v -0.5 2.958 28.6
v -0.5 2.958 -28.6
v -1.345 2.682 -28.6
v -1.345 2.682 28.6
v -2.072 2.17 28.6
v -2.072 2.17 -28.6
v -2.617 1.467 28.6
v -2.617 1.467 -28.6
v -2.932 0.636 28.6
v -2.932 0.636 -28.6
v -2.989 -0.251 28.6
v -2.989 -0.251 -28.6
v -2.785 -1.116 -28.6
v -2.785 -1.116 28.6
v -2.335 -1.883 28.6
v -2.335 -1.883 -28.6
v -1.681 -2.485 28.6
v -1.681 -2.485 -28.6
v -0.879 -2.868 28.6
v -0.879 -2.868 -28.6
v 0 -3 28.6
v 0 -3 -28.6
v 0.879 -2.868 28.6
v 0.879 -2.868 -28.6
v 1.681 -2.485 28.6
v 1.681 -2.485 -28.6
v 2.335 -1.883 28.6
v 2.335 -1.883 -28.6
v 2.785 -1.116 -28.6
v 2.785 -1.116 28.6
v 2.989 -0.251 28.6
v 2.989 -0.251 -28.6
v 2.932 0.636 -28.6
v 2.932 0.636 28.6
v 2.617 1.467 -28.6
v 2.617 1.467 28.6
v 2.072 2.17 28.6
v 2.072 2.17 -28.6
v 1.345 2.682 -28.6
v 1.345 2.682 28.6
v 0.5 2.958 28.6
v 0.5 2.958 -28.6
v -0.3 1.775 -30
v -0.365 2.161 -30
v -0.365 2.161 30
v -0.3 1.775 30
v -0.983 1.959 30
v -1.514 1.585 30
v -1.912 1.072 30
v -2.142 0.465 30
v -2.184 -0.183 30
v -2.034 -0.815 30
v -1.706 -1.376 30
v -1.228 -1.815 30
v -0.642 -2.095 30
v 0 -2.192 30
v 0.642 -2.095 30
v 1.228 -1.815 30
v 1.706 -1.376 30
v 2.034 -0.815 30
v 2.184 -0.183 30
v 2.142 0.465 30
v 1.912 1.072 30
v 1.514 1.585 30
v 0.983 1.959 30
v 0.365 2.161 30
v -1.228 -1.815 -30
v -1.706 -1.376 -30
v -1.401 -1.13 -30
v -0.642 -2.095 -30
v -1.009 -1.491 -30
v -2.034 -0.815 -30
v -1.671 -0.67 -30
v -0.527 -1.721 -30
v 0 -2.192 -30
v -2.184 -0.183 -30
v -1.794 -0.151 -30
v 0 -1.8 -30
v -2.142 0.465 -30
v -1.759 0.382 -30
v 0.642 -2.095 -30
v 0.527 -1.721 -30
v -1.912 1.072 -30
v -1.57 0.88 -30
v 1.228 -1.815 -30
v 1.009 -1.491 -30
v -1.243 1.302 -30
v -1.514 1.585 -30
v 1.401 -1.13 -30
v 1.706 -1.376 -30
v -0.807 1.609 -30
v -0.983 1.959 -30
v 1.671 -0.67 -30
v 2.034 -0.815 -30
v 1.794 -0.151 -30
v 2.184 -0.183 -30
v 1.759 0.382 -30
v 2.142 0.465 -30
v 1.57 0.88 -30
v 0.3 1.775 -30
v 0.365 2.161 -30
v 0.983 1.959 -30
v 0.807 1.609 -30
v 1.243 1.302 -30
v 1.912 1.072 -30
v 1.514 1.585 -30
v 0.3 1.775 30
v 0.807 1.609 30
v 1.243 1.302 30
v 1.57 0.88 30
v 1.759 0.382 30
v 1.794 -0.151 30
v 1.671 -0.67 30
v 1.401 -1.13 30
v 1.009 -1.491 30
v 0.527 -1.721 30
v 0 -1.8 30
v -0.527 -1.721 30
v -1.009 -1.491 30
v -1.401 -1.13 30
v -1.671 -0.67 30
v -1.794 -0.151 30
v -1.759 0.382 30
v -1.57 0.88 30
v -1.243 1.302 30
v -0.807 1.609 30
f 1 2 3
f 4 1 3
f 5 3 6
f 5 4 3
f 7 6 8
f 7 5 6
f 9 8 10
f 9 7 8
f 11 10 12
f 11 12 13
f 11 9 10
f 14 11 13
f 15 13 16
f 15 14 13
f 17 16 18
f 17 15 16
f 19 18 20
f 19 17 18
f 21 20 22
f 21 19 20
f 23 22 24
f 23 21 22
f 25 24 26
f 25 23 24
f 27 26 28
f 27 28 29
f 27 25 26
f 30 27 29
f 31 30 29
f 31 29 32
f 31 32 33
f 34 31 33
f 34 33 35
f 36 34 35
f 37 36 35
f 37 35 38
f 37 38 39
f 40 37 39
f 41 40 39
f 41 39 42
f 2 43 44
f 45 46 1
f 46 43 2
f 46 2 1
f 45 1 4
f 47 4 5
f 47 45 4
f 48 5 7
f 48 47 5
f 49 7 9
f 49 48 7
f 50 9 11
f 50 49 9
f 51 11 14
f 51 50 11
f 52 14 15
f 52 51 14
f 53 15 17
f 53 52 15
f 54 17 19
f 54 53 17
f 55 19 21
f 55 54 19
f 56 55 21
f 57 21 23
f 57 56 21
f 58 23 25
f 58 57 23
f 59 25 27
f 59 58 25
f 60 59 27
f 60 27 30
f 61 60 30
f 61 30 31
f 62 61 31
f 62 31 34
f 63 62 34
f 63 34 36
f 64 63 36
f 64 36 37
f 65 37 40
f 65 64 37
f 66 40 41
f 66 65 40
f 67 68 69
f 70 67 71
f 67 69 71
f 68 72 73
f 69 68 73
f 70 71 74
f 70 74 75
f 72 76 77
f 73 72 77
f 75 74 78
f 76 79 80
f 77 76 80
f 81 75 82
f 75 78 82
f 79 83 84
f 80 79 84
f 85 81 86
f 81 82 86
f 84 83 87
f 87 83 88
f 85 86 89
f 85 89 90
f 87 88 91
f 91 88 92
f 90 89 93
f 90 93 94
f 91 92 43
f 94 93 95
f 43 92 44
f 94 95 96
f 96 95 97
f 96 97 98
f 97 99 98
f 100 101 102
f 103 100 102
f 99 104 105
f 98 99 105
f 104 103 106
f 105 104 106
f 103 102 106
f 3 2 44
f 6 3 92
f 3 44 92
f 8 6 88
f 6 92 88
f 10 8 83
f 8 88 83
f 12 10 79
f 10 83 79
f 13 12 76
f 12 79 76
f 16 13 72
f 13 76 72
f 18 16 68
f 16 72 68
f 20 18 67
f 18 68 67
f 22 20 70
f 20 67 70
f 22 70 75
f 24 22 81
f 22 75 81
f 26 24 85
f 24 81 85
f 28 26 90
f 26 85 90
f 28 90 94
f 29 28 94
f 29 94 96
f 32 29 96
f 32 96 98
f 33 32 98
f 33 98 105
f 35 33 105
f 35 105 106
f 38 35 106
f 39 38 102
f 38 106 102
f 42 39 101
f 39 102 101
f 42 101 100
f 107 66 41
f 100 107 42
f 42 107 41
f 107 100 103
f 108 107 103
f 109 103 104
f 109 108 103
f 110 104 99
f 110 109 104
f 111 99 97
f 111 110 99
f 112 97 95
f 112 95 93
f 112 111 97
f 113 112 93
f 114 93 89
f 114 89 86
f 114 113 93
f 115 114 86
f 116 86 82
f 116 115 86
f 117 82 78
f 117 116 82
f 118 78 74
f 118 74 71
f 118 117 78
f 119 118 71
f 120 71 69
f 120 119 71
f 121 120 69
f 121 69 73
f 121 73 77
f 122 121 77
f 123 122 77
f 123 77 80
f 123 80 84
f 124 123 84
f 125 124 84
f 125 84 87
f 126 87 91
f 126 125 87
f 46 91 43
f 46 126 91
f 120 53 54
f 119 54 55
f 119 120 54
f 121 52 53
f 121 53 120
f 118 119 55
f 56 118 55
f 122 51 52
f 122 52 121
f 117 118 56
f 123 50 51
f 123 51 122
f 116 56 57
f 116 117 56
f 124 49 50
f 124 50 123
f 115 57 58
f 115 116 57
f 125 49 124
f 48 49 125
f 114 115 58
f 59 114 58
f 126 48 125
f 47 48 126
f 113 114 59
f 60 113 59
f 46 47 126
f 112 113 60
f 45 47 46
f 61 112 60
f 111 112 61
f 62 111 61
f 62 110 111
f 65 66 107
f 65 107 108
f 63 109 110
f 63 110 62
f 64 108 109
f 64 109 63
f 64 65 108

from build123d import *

# Parameters (mm, degrees)
BASE_EXTRUDE_THIN_DEPTH = 30
CHAMFER1_SIZE           = 1.4
CHAMFER1_SIZE2          = 0.808290377


with BuildPart() as part:
    # Sketch1 → Base-Extrude-Thin (new, symmetric)
    with BuildSketch(Plane.XY):
        with BuildLine():
            ThreePointArc((-0.5, 2.958039892), (0, -3), (0.5, 2.958039892))
            Line((0.5, 2.958039892), (0.3, 1.774823935))
            ThreePointArc((0.3, 1.774823935), (0, -1.8), (-0.3, 1.774823935))
            Line((-0.3, 1.774823935), (-0.5, 2.958039892))
        make_face()
    extrude(amount=BASE_EXTRUDE_THIN_DEPTH, both=True)

    # Chamfer1
    chamfer1_edges = [part.edges().sort_by_distance(p)[0] for p in [
        (0, -3, 30),
        (0, -3, -30),
    ]]
    chamfer1_side = [part.faces().sort_by_distance(p)[0] for p in [
        (0, -3, 0),
    ]]
    chamfer(chamfer1_edges, length=CHAMFER1_SIZE, length2=CHAMFER1_SIZE2, reference=chamfer1_side[0])


solid = part.part
